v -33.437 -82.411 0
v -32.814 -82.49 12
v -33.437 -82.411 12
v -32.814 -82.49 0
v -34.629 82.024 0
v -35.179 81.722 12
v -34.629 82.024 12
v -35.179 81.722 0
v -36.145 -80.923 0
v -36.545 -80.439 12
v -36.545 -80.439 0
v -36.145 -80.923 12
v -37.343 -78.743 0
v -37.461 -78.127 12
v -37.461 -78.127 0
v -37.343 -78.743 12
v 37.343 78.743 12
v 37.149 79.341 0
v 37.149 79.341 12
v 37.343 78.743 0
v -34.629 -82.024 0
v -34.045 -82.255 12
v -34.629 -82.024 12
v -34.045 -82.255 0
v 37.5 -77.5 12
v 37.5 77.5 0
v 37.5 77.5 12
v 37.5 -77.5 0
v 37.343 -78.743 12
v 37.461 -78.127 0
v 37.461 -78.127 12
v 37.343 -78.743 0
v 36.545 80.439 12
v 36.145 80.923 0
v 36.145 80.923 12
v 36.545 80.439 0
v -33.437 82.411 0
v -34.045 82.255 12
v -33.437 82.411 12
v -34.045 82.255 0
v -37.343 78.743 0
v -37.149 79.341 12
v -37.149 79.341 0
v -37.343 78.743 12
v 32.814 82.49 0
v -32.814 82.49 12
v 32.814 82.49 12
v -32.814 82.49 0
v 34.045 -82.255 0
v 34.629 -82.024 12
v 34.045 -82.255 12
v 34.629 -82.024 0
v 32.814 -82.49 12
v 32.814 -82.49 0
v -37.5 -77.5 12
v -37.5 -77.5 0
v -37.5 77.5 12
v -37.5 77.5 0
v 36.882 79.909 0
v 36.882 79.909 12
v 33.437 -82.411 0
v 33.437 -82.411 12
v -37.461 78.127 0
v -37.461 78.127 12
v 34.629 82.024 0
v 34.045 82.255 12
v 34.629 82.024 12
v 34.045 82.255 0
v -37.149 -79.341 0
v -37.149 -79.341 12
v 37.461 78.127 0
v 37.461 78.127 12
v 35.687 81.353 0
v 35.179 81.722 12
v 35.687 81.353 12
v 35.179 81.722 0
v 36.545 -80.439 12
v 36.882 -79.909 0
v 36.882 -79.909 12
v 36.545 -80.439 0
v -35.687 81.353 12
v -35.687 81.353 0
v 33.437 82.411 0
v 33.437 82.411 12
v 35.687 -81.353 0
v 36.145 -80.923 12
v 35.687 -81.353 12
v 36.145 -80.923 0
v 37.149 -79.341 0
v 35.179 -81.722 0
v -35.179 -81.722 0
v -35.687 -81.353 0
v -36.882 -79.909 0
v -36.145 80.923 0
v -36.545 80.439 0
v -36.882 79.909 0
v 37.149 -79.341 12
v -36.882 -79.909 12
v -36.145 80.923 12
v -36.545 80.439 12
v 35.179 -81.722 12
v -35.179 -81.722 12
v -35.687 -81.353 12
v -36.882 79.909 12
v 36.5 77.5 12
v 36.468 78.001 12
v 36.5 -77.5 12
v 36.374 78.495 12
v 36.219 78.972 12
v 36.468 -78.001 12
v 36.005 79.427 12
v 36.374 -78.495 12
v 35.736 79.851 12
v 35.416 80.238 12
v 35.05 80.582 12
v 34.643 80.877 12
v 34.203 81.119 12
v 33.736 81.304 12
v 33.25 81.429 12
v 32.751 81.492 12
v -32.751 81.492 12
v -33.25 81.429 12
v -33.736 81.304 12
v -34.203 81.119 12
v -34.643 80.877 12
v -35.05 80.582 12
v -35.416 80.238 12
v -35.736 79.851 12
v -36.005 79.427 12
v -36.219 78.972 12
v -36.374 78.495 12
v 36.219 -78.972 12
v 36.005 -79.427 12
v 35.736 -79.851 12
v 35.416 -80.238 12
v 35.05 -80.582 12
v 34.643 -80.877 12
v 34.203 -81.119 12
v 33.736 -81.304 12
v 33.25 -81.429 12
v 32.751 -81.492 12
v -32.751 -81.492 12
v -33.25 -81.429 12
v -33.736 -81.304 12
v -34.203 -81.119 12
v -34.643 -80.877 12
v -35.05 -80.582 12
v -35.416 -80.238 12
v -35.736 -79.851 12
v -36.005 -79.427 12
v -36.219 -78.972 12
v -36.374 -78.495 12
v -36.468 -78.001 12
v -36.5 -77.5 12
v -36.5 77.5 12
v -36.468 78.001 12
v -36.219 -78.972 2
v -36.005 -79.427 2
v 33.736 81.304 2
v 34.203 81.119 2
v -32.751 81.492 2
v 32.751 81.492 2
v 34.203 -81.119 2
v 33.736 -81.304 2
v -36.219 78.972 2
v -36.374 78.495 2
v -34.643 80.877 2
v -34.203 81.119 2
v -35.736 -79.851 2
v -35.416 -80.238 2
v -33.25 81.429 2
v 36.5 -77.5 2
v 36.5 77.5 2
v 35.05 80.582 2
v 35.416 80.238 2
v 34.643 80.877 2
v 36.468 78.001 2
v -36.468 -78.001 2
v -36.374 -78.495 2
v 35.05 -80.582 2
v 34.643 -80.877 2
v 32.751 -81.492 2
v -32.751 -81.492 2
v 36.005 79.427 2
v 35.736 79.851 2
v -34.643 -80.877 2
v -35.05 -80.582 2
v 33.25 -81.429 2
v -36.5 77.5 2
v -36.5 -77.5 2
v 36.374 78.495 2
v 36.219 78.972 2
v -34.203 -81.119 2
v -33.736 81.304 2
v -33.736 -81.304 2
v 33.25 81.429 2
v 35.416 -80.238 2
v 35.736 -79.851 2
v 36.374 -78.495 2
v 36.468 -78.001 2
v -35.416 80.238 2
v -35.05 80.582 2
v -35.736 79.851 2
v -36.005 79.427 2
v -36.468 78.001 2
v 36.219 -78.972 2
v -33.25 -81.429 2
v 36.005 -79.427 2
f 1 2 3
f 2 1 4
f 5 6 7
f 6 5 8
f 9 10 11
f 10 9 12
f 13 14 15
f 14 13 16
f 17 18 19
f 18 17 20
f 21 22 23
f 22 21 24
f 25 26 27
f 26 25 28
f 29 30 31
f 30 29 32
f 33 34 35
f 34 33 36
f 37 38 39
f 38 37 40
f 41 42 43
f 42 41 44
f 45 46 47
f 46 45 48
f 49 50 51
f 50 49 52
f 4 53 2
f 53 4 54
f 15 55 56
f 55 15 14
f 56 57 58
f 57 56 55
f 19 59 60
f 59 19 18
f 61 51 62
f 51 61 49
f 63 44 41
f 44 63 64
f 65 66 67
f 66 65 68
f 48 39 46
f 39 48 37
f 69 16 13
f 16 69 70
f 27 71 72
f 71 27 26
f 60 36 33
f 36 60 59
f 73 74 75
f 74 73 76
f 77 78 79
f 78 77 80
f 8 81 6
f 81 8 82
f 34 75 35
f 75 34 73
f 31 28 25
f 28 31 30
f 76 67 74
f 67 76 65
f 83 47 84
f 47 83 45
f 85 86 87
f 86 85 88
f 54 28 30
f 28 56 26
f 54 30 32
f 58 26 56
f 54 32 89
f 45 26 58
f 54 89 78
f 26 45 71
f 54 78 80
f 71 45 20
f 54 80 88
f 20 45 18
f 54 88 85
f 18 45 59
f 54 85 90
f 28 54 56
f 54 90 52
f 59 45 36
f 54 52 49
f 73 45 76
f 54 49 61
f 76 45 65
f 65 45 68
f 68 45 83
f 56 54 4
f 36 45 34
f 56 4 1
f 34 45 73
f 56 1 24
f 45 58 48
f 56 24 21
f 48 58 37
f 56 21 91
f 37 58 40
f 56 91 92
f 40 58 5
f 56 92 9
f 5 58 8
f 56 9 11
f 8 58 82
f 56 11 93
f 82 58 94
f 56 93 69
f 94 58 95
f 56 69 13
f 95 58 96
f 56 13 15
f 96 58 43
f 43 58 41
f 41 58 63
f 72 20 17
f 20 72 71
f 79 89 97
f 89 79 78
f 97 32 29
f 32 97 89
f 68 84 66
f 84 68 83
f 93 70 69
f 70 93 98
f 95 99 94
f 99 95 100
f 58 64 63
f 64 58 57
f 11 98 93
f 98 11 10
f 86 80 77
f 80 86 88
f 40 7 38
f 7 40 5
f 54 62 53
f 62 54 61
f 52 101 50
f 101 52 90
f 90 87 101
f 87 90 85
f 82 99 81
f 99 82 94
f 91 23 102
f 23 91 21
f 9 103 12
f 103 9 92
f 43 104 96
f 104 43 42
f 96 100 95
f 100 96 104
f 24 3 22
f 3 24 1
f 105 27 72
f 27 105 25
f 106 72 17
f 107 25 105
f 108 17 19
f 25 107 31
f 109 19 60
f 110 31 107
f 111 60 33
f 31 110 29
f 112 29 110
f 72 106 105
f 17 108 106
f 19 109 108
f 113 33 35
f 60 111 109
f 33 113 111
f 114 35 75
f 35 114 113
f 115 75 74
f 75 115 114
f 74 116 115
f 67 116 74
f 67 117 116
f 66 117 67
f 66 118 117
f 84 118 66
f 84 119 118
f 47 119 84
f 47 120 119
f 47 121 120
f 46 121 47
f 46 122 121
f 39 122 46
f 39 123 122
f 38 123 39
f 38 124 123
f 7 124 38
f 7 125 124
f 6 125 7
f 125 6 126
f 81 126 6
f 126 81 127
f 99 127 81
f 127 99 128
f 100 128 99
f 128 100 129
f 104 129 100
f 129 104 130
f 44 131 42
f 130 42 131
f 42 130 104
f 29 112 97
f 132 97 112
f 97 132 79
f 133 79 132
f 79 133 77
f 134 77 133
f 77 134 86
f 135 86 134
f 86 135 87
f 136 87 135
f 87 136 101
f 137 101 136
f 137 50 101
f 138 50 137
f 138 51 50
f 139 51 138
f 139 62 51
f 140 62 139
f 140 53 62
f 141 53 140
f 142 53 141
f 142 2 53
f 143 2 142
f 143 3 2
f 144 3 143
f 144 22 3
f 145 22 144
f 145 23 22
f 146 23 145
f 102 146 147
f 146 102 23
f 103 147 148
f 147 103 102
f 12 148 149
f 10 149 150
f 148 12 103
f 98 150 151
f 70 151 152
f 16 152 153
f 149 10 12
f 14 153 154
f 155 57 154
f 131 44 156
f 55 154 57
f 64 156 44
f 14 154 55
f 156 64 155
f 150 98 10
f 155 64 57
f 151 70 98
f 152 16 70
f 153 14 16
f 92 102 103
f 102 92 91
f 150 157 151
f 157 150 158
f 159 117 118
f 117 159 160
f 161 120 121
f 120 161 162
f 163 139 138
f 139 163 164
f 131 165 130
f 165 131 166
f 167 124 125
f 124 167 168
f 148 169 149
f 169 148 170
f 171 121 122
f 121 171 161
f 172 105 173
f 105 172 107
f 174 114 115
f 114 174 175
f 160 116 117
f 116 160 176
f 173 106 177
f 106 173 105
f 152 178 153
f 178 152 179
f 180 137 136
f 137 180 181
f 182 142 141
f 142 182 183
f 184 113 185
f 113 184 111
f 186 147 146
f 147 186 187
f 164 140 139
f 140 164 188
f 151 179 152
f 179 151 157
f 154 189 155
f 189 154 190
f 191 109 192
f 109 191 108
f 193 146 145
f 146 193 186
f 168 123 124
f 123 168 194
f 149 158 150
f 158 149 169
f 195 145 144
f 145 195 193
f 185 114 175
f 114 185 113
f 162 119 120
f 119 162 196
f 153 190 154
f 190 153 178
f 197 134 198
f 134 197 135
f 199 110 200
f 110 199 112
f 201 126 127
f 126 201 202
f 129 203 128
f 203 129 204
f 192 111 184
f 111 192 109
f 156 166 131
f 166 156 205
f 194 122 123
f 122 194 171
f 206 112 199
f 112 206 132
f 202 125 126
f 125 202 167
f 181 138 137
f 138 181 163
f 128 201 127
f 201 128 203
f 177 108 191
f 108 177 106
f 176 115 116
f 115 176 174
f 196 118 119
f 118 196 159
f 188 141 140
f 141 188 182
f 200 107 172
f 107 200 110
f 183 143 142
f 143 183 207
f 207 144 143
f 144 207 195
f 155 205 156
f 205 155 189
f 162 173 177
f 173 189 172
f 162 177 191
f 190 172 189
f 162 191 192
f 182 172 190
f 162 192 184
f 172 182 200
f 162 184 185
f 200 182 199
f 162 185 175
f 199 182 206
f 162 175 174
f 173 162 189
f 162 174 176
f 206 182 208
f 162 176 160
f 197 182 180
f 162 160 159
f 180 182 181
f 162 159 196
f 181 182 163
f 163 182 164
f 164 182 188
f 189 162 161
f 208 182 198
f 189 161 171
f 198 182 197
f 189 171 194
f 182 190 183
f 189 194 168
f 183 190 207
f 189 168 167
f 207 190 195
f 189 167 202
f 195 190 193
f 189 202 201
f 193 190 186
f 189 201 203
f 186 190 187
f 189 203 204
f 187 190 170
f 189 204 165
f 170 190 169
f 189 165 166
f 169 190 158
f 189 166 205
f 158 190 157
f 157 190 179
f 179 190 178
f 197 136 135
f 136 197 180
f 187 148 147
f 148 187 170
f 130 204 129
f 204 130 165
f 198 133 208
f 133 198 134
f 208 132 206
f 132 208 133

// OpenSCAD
$fn = 50;


difference() {
	union() {
		hull() {
			translate(v = [-32.5000000000, 77.5000000000, 0]) {
				cylinder(h = 12, r = 5);
			}
			translate(v = [32.5000000000, 77.5000000000, 0]) {
				cylinder(h = 12, r = 5);
			}
			translate(v = [-32.5000000000, -77.5000000000, 0]) {
				cylinder(h = 12, r = 5);
			}
			translate(v = [32.5000000000, -77.5000000000, 0]) {
				cylinder(h = 12, r = 5);
			}
		}
	}
	union() {
		translate(v = [0, 0, 2]) {
			hull() {
				translate(v = [-32.5000000000, 77.5000000000, 0]) {
					cylinder(h = 10, r = 4);
				}
				translate(v = [32.5000000000, 77.5000000000, 0]) {
					cylinder(h = 10, r = 4);
				}
				translate(v = [-32.5000000000, -77.5000000000, 0]) {
					cylinder(h = 10, r = 4);
				}
				translate(v = [32.5000000000, -77.5000000000, 0]) {
					cylinder(h = 10, r = 4);
				}
			}
		}
	}
}
